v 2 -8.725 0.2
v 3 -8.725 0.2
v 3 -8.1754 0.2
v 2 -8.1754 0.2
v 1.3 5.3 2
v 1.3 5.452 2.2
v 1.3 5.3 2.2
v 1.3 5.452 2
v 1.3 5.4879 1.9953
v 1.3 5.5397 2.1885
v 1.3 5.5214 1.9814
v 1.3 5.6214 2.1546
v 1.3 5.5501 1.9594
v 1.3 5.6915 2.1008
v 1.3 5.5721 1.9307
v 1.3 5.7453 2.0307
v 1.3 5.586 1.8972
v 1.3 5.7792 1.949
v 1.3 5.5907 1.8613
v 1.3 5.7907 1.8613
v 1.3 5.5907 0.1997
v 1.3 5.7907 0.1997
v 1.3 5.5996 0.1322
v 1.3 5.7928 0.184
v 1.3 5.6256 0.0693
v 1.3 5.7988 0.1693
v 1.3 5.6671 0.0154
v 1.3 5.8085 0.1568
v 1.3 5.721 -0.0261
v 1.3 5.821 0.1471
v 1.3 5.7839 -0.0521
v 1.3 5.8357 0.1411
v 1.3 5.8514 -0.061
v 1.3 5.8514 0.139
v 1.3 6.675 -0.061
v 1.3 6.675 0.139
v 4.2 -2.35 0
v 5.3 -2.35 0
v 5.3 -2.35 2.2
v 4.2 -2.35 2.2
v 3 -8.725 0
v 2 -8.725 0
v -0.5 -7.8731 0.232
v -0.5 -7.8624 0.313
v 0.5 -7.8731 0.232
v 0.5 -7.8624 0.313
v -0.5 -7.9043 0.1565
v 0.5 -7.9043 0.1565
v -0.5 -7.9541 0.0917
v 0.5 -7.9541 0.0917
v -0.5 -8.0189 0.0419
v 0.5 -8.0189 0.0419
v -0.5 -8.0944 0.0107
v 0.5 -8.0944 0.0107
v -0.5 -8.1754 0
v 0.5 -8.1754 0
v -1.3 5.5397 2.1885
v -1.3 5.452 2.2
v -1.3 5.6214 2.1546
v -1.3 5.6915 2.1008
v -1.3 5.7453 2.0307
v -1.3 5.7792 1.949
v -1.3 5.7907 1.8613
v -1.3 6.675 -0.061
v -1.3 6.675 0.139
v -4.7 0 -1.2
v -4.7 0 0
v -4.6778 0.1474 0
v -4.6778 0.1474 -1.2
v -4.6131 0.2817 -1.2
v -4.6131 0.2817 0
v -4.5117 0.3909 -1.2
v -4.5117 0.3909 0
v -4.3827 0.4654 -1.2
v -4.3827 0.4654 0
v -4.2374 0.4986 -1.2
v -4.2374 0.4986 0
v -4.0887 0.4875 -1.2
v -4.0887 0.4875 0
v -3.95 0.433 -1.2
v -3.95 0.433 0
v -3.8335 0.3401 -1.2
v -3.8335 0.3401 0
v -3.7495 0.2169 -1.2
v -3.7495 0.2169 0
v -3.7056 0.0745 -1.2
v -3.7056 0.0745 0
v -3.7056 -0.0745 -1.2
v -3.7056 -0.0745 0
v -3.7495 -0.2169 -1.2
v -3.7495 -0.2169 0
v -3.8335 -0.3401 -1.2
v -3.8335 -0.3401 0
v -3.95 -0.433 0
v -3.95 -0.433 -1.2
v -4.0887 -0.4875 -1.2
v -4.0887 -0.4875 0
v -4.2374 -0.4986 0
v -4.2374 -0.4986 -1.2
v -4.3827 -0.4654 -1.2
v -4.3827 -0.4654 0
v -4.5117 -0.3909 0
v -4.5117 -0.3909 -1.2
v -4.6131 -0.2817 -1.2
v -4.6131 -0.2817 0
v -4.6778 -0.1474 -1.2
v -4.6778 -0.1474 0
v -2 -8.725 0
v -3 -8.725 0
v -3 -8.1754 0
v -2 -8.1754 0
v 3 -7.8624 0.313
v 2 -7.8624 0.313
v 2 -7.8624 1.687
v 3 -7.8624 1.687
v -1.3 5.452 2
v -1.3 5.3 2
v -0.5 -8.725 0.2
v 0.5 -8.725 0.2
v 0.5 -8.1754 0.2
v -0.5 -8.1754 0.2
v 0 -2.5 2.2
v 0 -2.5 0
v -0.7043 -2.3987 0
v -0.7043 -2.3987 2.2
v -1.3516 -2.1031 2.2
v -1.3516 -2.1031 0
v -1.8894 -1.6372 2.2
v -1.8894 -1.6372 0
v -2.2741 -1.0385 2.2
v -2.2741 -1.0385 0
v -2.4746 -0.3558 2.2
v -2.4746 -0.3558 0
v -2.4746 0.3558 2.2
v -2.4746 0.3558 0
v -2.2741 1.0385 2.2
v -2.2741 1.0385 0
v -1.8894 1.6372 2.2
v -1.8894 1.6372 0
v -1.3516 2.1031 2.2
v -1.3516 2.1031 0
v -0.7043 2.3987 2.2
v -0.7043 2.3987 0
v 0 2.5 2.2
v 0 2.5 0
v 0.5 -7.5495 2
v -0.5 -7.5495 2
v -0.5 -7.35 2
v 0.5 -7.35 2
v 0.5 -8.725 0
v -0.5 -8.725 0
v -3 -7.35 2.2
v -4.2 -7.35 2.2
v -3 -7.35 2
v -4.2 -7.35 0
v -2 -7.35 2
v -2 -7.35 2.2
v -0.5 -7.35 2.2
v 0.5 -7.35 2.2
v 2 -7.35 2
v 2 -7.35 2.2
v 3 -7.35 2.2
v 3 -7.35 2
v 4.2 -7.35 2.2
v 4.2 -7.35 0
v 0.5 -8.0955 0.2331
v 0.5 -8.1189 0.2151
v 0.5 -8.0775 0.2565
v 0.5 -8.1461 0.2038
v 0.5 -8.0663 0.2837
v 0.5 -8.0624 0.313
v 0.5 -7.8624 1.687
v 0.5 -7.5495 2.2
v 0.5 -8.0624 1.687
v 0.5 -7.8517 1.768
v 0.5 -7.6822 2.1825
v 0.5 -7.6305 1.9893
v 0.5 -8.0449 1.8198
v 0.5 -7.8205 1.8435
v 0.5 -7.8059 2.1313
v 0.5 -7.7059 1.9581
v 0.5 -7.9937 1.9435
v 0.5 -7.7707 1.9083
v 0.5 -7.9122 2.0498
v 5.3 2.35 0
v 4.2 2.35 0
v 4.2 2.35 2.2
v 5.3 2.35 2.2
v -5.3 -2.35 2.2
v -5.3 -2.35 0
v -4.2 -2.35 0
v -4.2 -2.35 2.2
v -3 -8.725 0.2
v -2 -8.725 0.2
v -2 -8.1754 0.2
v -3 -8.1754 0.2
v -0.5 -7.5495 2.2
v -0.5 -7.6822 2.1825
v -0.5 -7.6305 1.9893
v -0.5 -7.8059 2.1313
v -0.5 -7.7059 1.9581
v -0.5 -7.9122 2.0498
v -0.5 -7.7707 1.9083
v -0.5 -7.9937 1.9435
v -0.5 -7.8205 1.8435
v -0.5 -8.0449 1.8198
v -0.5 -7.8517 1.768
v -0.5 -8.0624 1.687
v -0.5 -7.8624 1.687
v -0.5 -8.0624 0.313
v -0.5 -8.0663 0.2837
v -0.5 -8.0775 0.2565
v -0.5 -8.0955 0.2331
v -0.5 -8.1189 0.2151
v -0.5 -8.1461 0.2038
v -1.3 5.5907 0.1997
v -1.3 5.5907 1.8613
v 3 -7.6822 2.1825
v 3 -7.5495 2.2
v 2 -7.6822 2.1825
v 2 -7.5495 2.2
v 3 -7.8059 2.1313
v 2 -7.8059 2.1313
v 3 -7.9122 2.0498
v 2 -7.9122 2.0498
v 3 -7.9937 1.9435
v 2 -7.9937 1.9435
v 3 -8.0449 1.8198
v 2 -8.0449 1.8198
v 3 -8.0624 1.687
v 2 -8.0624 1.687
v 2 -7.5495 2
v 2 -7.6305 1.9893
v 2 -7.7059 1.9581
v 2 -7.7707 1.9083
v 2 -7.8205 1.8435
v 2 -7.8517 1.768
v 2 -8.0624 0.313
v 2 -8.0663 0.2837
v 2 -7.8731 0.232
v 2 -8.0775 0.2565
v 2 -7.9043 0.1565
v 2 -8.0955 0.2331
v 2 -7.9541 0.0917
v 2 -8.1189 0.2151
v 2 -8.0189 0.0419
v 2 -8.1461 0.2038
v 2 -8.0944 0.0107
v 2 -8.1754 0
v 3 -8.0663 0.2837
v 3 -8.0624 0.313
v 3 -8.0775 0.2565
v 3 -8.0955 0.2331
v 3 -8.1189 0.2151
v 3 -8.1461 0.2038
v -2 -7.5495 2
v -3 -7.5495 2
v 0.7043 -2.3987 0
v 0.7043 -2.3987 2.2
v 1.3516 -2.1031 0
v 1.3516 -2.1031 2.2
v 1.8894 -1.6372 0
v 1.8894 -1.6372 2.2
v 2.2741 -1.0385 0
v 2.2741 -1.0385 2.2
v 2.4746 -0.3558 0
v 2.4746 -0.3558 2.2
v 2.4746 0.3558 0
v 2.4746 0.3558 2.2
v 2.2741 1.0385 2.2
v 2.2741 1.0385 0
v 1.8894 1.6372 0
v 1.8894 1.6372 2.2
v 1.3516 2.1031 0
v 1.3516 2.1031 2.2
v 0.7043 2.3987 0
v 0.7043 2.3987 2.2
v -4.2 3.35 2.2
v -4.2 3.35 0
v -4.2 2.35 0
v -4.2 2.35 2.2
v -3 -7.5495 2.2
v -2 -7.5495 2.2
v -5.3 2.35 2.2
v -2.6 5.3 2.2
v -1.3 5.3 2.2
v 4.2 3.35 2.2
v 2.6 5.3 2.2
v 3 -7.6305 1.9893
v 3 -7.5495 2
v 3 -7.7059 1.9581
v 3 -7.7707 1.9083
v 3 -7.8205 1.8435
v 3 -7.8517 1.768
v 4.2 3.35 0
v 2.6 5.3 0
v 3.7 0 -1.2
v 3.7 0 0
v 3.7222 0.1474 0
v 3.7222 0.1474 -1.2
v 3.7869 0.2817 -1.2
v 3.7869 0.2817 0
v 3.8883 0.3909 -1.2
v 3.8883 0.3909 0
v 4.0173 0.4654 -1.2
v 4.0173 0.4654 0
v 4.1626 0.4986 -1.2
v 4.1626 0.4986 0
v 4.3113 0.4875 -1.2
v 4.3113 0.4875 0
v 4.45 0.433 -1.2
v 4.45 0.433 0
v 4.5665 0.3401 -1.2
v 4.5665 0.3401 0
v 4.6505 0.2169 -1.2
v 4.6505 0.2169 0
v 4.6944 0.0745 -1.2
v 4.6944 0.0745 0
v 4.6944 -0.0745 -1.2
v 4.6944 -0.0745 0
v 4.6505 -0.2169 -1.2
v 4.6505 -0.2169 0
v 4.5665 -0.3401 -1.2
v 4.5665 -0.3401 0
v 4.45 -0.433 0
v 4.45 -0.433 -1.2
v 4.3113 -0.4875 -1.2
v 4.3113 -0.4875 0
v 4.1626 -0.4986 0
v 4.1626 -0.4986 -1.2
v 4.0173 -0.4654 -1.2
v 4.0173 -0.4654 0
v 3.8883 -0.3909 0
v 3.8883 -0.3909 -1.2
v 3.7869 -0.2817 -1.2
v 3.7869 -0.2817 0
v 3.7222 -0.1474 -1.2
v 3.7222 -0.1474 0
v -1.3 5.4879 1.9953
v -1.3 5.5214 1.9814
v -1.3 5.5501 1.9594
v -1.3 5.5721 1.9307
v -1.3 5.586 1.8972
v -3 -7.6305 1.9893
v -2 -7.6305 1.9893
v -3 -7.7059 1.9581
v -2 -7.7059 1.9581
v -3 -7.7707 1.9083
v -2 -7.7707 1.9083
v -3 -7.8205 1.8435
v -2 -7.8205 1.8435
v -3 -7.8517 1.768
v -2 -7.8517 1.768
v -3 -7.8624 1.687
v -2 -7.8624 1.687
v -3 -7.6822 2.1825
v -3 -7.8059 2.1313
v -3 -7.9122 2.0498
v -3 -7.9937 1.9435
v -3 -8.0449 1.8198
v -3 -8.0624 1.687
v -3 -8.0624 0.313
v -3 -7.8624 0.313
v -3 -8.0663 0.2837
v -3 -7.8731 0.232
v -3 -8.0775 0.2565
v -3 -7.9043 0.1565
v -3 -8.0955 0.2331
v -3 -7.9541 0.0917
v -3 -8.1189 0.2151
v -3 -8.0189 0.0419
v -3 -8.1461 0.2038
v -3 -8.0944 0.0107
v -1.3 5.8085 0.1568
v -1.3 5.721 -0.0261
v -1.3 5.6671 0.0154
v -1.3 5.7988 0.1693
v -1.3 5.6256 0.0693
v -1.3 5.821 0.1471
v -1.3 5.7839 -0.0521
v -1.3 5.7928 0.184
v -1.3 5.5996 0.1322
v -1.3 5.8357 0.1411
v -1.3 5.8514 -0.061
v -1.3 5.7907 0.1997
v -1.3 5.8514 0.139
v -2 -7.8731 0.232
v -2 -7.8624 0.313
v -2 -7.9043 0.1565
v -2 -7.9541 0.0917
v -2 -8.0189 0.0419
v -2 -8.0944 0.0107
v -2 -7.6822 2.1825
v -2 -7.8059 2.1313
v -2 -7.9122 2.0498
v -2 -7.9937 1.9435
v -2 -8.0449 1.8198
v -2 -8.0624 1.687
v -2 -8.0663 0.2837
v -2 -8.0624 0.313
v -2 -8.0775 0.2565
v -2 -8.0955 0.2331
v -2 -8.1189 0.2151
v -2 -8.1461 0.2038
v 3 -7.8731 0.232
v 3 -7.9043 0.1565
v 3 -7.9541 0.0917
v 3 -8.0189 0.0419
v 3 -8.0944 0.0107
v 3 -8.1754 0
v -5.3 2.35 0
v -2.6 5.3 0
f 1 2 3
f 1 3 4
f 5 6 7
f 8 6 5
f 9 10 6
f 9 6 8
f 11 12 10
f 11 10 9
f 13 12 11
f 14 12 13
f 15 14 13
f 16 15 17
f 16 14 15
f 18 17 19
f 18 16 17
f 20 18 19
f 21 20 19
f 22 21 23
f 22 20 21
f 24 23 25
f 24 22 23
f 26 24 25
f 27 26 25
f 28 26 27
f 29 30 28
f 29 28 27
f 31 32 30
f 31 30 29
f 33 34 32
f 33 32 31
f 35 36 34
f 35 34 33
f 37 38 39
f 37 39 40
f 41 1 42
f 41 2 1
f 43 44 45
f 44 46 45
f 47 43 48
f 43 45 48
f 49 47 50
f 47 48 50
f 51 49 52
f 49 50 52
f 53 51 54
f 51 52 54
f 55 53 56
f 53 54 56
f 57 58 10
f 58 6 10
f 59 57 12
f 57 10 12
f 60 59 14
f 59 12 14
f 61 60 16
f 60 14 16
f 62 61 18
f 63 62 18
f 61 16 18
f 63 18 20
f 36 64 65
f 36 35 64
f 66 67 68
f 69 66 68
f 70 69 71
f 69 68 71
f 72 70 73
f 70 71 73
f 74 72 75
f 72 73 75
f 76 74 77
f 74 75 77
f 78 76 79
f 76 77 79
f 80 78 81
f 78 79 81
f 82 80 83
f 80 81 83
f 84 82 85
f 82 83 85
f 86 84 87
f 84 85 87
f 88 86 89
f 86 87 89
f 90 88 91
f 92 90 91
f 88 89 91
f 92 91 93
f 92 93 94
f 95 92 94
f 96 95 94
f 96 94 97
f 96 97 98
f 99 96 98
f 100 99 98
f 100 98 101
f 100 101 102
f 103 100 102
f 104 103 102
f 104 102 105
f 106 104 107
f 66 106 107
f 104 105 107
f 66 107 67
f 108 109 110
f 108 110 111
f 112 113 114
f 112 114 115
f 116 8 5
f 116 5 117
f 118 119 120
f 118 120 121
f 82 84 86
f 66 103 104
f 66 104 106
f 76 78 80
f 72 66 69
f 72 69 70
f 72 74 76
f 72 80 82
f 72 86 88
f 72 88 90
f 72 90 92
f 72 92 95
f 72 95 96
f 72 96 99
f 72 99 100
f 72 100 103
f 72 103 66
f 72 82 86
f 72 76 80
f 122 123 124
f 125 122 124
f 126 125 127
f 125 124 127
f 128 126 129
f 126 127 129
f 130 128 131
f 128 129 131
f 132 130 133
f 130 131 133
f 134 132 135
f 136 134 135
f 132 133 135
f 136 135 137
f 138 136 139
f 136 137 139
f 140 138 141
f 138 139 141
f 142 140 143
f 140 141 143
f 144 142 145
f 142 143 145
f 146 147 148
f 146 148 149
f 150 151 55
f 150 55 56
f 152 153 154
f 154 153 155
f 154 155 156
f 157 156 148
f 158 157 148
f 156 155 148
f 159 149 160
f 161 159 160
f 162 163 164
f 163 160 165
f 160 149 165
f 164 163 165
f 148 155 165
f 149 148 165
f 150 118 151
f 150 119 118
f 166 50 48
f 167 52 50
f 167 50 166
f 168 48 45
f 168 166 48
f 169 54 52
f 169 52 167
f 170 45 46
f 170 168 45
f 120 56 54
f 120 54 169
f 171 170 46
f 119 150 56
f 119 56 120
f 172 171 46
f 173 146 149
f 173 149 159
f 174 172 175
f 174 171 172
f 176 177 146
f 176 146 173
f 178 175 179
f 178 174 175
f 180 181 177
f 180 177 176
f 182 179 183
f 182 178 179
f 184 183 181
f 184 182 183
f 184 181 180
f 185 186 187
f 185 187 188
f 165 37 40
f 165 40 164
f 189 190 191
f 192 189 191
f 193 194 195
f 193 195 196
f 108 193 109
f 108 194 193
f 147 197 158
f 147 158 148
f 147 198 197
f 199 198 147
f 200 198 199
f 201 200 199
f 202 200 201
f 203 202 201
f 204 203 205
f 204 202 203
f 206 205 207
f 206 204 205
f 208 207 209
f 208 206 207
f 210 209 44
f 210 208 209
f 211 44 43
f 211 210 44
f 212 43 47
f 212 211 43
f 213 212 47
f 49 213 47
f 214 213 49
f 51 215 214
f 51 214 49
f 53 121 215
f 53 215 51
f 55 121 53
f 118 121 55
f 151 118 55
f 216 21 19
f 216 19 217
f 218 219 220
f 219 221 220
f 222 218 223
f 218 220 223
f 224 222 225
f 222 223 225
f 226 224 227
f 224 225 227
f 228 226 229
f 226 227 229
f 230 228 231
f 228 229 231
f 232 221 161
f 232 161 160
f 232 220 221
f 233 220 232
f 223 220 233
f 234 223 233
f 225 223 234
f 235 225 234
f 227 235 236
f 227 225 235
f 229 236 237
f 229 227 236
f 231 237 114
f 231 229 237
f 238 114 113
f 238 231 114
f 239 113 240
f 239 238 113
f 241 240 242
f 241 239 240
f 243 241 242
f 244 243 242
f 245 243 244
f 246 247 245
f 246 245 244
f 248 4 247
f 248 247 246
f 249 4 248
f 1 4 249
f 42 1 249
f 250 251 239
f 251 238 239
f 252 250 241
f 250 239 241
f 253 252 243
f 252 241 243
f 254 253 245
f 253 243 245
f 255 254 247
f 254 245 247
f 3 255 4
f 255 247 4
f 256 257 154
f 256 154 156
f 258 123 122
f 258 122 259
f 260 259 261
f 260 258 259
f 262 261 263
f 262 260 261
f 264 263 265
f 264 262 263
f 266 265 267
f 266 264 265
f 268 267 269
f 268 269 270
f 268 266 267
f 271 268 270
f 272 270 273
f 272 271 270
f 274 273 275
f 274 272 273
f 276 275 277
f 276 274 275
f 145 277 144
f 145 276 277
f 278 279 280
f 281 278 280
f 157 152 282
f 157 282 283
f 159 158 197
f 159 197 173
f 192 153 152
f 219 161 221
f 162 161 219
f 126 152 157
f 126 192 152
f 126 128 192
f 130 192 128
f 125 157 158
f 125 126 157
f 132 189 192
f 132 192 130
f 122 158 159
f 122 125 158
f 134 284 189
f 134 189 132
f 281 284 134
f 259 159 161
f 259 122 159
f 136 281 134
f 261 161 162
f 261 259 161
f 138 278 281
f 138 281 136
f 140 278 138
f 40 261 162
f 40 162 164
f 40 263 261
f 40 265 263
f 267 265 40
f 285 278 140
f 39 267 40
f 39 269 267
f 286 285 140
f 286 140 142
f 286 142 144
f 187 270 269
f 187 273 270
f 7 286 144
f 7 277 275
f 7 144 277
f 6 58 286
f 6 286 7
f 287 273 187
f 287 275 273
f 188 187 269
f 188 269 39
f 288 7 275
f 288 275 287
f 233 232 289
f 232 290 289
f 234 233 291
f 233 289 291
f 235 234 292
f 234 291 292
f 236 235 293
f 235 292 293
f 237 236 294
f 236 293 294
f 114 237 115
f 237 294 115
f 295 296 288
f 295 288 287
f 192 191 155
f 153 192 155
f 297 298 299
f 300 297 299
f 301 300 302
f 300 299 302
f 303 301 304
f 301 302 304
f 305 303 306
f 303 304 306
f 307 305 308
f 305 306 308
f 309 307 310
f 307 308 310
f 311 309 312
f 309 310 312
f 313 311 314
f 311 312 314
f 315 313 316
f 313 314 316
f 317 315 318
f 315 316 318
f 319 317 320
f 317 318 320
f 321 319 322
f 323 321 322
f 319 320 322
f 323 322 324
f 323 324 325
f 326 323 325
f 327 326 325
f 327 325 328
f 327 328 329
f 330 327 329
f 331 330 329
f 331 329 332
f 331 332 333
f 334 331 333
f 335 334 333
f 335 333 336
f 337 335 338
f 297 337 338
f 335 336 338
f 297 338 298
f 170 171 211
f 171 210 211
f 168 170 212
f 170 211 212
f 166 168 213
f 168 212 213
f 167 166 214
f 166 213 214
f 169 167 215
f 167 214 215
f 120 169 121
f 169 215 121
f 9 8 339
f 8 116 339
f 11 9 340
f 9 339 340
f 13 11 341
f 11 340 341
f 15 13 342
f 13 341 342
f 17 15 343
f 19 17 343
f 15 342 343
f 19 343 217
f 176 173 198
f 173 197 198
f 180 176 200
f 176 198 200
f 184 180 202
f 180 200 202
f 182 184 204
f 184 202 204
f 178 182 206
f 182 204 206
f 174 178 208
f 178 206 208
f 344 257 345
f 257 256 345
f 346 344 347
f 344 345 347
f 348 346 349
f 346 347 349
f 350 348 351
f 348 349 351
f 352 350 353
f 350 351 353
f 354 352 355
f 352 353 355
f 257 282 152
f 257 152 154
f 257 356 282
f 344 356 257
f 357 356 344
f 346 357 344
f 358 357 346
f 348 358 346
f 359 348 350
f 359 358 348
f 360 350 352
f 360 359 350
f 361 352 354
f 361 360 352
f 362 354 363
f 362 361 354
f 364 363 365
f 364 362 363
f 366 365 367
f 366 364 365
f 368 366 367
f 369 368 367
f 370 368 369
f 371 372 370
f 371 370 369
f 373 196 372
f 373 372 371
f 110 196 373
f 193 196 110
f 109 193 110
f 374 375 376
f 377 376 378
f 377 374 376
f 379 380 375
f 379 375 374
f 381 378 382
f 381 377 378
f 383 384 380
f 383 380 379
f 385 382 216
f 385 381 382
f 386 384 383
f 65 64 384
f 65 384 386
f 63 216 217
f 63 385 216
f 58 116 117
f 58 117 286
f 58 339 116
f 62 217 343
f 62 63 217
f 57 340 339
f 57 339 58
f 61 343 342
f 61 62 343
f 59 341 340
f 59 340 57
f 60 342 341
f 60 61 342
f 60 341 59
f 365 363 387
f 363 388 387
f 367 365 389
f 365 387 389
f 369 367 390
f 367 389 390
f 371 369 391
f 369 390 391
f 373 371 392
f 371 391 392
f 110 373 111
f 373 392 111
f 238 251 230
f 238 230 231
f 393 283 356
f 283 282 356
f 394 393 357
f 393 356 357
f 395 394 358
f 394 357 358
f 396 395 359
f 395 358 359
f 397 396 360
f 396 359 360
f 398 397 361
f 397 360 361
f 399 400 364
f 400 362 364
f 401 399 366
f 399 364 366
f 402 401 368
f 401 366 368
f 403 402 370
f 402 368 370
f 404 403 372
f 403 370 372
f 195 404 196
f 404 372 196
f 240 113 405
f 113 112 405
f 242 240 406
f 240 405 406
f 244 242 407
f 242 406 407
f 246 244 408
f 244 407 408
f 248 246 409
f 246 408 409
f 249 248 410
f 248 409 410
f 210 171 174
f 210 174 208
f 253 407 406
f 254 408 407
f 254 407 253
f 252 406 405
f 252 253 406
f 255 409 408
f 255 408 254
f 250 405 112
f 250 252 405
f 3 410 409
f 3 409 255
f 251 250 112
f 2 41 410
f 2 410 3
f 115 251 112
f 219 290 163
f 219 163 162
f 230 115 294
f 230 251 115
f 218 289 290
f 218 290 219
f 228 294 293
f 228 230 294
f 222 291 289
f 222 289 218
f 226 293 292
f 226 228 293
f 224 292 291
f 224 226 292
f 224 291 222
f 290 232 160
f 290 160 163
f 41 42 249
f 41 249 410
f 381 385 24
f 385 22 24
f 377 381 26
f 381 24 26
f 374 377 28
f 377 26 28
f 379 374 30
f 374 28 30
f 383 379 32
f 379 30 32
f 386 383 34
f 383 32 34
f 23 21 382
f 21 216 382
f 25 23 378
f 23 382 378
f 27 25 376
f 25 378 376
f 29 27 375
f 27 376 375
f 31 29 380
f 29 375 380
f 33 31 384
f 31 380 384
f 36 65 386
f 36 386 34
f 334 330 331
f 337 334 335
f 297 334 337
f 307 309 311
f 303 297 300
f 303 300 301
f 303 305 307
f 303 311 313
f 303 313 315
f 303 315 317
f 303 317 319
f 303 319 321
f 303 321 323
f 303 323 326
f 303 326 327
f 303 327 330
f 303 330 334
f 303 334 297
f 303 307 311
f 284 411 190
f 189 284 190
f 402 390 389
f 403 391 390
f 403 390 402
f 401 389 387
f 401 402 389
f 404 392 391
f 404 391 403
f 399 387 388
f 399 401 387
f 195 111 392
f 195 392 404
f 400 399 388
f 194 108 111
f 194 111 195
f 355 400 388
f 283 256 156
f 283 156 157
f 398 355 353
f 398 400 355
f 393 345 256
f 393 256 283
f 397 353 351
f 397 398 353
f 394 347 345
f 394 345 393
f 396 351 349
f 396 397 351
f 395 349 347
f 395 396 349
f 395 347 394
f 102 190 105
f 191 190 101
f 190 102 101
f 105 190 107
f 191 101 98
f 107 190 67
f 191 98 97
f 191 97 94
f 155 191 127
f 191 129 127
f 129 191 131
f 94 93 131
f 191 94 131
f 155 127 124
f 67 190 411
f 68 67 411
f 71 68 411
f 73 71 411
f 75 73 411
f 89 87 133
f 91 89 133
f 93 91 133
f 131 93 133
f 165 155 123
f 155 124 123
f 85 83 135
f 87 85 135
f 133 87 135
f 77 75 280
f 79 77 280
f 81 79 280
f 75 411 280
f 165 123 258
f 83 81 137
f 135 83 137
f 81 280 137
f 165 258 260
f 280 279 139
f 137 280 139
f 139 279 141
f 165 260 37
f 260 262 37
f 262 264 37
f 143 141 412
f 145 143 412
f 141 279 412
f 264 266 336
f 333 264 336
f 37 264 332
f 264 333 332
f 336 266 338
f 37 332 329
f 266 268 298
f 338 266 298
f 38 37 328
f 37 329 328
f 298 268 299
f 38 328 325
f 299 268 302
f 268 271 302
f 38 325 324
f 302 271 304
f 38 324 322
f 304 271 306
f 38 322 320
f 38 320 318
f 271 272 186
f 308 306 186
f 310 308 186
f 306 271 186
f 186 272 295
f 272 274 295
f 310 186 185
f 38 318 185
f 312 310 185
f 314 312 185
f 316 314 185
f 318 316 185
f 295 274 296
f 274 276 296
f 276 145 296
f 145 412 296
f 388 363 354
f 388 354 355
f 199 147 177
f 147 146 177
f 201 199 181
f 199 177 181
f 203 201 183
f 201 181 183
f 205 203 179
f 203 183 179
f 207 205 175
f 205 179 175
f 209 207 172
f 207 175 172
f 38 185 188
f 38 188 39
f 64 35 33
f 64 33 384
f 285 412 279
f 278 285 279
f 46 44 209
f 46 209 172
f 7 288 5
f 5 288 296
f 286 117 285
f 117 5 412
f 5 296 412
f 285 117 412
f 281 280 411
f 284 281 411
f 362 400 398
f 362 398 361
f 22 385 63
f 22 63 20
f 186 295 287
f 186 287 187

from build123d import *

# Parameters (mm, degrees)
BOSS_EXTRUDE1_DEPTH = 2.2
SKETCH2_W           = 1
SKETCH2_H           = 0.2
SKETCH4_W           = 2.6
SKETCH4_H           = 0.2
SKETCH6_R           = 0.5
BOSS_EXTRUDE2_DEPTH = 1.2


with BuildPart() as part:
    # Sketch1 → Boss-Extrude1 (new body)
    with BuildSketch(Plane.XY):
        with BuildLine():
            Line((0, 5.3), (2.6, 5.3))
            Line((2.6, 5.3), (4.2, 3.35))
            Line((4.2, 3.35), (4.2, 2.35))
            Line((4.2, 2.35), (5.3, 2.35))
            Line((5.3, 2.35), (5.3, -2.35))
            Line((5.3, -2.35), (4.2, -2.35))
            Line((4.2, -2.35), (4.2, -7.35))
            Line((4.2, -7.35), (0, -7.35))
            Line((0, -7.35), (0, -2.5))
            ThreePointArc((0, -2.5), (2.5, 0), (0, 2.5))
            Line((0, 2.5), (0, 5.3))
        make_face()
    boss_extrude1 = extrude(amount=BOSS_EXTRUDE1_DEPTH)

    # Mirror1: Boss-Extrude1 across plane
    add(boss_extrude1.mirror(Plane(origin=(0, -7.35, 2.2), x_dir=(0, 0, 1), z_dir=(1, 0, 0))))

    # Sweep1: sweep along a path in Sketch3
    with BuildLine(Plane(origin=(0, 0, 0), x_dir=(0, 0, -1), z_dir=(1, 0, 0))) as sweep1_path:
        Line((-2, -7.35), (-2, -7.549456001))
        ThreePointArc((-2, -7.549456001), (-1.908338682, -7.770745997), (-1.687048686, -7.862407315))
        Line((-1.687048686, -7.862407315), (-0.312951314, -7.862407315))
        ThreePointArc((-0.312951314, -7.862407315), (-0.091661318, -7.954068633), (0, -8.17535863))
        Line((0, -8.17535863), (0, -8.725))
    # Sketch2 → Sweep1 (sweep)
    with BuildSketch(Plane.XZ.offset(7.35)):
        with Locations((-2.5, 2.1)):
            Rectangle(SKETCH2_W, SKETCH2_H)
        with Locations((0, 2.1)):
            Rectangle(SKETCH2_W, SKETCH2_H)
        with Locations((2.5, 2.1)):
            Rectangle(SKETCH2_W, SKETCH2_H)
    sweep(path=sweep1_path.line)

    # Sweep2: sweep along a path in Sketch5
    with BuildLine(Plane(origin=(0, 0, 0), x_dir=(0, 0, -1), z_dir=(1, 0, 0))) as sweep2_path:
        Line((-2.060981918, 5.3), (-2.060981918, 5.452016603))
        ThreePointArc((-2.060981918, 5.452016603), (-2.002498709, 5.59320756), (-1.861307752, 5.651690769))
        Line((-1.861307752, 5.651690769), (-0.199674166, 5.651690769))
        ThreePointArc((-0.199674166, 5.651690769), (-0.058483209, 5.710173978), (0, 5.851364935))
        Line((0, 5.851364935), (0, 6.675))
    # Sketch4 → Sweep2 (sweep)
    with BuildSketch(Plane(origin=(0, 5.3, 0), x_dir=(1, 0, 0), z_dir=(0, 1, 0))):
        with Locations((0, -2.1)):
            Rectangle(SKETCH4_W, SKETCH4_H)
    sweep(path=sweep2_path.line)

    # Sketch6 → Boss-Extrude2 (add)
    with BuildSketch(Plane(origin=(0, 0, 0), x_dir=(-1, 0, 0), z_dir=(0, 0, -1))):
        with Locations((-4.2, 0)):
            Circle(SKETCH6_R)
        with Locations((4.2, 0)):
            Circle(SKETCH6_R)
    extrude(amount=BOSS_EXTRUDE2_DEPTH)


solid = part.part
